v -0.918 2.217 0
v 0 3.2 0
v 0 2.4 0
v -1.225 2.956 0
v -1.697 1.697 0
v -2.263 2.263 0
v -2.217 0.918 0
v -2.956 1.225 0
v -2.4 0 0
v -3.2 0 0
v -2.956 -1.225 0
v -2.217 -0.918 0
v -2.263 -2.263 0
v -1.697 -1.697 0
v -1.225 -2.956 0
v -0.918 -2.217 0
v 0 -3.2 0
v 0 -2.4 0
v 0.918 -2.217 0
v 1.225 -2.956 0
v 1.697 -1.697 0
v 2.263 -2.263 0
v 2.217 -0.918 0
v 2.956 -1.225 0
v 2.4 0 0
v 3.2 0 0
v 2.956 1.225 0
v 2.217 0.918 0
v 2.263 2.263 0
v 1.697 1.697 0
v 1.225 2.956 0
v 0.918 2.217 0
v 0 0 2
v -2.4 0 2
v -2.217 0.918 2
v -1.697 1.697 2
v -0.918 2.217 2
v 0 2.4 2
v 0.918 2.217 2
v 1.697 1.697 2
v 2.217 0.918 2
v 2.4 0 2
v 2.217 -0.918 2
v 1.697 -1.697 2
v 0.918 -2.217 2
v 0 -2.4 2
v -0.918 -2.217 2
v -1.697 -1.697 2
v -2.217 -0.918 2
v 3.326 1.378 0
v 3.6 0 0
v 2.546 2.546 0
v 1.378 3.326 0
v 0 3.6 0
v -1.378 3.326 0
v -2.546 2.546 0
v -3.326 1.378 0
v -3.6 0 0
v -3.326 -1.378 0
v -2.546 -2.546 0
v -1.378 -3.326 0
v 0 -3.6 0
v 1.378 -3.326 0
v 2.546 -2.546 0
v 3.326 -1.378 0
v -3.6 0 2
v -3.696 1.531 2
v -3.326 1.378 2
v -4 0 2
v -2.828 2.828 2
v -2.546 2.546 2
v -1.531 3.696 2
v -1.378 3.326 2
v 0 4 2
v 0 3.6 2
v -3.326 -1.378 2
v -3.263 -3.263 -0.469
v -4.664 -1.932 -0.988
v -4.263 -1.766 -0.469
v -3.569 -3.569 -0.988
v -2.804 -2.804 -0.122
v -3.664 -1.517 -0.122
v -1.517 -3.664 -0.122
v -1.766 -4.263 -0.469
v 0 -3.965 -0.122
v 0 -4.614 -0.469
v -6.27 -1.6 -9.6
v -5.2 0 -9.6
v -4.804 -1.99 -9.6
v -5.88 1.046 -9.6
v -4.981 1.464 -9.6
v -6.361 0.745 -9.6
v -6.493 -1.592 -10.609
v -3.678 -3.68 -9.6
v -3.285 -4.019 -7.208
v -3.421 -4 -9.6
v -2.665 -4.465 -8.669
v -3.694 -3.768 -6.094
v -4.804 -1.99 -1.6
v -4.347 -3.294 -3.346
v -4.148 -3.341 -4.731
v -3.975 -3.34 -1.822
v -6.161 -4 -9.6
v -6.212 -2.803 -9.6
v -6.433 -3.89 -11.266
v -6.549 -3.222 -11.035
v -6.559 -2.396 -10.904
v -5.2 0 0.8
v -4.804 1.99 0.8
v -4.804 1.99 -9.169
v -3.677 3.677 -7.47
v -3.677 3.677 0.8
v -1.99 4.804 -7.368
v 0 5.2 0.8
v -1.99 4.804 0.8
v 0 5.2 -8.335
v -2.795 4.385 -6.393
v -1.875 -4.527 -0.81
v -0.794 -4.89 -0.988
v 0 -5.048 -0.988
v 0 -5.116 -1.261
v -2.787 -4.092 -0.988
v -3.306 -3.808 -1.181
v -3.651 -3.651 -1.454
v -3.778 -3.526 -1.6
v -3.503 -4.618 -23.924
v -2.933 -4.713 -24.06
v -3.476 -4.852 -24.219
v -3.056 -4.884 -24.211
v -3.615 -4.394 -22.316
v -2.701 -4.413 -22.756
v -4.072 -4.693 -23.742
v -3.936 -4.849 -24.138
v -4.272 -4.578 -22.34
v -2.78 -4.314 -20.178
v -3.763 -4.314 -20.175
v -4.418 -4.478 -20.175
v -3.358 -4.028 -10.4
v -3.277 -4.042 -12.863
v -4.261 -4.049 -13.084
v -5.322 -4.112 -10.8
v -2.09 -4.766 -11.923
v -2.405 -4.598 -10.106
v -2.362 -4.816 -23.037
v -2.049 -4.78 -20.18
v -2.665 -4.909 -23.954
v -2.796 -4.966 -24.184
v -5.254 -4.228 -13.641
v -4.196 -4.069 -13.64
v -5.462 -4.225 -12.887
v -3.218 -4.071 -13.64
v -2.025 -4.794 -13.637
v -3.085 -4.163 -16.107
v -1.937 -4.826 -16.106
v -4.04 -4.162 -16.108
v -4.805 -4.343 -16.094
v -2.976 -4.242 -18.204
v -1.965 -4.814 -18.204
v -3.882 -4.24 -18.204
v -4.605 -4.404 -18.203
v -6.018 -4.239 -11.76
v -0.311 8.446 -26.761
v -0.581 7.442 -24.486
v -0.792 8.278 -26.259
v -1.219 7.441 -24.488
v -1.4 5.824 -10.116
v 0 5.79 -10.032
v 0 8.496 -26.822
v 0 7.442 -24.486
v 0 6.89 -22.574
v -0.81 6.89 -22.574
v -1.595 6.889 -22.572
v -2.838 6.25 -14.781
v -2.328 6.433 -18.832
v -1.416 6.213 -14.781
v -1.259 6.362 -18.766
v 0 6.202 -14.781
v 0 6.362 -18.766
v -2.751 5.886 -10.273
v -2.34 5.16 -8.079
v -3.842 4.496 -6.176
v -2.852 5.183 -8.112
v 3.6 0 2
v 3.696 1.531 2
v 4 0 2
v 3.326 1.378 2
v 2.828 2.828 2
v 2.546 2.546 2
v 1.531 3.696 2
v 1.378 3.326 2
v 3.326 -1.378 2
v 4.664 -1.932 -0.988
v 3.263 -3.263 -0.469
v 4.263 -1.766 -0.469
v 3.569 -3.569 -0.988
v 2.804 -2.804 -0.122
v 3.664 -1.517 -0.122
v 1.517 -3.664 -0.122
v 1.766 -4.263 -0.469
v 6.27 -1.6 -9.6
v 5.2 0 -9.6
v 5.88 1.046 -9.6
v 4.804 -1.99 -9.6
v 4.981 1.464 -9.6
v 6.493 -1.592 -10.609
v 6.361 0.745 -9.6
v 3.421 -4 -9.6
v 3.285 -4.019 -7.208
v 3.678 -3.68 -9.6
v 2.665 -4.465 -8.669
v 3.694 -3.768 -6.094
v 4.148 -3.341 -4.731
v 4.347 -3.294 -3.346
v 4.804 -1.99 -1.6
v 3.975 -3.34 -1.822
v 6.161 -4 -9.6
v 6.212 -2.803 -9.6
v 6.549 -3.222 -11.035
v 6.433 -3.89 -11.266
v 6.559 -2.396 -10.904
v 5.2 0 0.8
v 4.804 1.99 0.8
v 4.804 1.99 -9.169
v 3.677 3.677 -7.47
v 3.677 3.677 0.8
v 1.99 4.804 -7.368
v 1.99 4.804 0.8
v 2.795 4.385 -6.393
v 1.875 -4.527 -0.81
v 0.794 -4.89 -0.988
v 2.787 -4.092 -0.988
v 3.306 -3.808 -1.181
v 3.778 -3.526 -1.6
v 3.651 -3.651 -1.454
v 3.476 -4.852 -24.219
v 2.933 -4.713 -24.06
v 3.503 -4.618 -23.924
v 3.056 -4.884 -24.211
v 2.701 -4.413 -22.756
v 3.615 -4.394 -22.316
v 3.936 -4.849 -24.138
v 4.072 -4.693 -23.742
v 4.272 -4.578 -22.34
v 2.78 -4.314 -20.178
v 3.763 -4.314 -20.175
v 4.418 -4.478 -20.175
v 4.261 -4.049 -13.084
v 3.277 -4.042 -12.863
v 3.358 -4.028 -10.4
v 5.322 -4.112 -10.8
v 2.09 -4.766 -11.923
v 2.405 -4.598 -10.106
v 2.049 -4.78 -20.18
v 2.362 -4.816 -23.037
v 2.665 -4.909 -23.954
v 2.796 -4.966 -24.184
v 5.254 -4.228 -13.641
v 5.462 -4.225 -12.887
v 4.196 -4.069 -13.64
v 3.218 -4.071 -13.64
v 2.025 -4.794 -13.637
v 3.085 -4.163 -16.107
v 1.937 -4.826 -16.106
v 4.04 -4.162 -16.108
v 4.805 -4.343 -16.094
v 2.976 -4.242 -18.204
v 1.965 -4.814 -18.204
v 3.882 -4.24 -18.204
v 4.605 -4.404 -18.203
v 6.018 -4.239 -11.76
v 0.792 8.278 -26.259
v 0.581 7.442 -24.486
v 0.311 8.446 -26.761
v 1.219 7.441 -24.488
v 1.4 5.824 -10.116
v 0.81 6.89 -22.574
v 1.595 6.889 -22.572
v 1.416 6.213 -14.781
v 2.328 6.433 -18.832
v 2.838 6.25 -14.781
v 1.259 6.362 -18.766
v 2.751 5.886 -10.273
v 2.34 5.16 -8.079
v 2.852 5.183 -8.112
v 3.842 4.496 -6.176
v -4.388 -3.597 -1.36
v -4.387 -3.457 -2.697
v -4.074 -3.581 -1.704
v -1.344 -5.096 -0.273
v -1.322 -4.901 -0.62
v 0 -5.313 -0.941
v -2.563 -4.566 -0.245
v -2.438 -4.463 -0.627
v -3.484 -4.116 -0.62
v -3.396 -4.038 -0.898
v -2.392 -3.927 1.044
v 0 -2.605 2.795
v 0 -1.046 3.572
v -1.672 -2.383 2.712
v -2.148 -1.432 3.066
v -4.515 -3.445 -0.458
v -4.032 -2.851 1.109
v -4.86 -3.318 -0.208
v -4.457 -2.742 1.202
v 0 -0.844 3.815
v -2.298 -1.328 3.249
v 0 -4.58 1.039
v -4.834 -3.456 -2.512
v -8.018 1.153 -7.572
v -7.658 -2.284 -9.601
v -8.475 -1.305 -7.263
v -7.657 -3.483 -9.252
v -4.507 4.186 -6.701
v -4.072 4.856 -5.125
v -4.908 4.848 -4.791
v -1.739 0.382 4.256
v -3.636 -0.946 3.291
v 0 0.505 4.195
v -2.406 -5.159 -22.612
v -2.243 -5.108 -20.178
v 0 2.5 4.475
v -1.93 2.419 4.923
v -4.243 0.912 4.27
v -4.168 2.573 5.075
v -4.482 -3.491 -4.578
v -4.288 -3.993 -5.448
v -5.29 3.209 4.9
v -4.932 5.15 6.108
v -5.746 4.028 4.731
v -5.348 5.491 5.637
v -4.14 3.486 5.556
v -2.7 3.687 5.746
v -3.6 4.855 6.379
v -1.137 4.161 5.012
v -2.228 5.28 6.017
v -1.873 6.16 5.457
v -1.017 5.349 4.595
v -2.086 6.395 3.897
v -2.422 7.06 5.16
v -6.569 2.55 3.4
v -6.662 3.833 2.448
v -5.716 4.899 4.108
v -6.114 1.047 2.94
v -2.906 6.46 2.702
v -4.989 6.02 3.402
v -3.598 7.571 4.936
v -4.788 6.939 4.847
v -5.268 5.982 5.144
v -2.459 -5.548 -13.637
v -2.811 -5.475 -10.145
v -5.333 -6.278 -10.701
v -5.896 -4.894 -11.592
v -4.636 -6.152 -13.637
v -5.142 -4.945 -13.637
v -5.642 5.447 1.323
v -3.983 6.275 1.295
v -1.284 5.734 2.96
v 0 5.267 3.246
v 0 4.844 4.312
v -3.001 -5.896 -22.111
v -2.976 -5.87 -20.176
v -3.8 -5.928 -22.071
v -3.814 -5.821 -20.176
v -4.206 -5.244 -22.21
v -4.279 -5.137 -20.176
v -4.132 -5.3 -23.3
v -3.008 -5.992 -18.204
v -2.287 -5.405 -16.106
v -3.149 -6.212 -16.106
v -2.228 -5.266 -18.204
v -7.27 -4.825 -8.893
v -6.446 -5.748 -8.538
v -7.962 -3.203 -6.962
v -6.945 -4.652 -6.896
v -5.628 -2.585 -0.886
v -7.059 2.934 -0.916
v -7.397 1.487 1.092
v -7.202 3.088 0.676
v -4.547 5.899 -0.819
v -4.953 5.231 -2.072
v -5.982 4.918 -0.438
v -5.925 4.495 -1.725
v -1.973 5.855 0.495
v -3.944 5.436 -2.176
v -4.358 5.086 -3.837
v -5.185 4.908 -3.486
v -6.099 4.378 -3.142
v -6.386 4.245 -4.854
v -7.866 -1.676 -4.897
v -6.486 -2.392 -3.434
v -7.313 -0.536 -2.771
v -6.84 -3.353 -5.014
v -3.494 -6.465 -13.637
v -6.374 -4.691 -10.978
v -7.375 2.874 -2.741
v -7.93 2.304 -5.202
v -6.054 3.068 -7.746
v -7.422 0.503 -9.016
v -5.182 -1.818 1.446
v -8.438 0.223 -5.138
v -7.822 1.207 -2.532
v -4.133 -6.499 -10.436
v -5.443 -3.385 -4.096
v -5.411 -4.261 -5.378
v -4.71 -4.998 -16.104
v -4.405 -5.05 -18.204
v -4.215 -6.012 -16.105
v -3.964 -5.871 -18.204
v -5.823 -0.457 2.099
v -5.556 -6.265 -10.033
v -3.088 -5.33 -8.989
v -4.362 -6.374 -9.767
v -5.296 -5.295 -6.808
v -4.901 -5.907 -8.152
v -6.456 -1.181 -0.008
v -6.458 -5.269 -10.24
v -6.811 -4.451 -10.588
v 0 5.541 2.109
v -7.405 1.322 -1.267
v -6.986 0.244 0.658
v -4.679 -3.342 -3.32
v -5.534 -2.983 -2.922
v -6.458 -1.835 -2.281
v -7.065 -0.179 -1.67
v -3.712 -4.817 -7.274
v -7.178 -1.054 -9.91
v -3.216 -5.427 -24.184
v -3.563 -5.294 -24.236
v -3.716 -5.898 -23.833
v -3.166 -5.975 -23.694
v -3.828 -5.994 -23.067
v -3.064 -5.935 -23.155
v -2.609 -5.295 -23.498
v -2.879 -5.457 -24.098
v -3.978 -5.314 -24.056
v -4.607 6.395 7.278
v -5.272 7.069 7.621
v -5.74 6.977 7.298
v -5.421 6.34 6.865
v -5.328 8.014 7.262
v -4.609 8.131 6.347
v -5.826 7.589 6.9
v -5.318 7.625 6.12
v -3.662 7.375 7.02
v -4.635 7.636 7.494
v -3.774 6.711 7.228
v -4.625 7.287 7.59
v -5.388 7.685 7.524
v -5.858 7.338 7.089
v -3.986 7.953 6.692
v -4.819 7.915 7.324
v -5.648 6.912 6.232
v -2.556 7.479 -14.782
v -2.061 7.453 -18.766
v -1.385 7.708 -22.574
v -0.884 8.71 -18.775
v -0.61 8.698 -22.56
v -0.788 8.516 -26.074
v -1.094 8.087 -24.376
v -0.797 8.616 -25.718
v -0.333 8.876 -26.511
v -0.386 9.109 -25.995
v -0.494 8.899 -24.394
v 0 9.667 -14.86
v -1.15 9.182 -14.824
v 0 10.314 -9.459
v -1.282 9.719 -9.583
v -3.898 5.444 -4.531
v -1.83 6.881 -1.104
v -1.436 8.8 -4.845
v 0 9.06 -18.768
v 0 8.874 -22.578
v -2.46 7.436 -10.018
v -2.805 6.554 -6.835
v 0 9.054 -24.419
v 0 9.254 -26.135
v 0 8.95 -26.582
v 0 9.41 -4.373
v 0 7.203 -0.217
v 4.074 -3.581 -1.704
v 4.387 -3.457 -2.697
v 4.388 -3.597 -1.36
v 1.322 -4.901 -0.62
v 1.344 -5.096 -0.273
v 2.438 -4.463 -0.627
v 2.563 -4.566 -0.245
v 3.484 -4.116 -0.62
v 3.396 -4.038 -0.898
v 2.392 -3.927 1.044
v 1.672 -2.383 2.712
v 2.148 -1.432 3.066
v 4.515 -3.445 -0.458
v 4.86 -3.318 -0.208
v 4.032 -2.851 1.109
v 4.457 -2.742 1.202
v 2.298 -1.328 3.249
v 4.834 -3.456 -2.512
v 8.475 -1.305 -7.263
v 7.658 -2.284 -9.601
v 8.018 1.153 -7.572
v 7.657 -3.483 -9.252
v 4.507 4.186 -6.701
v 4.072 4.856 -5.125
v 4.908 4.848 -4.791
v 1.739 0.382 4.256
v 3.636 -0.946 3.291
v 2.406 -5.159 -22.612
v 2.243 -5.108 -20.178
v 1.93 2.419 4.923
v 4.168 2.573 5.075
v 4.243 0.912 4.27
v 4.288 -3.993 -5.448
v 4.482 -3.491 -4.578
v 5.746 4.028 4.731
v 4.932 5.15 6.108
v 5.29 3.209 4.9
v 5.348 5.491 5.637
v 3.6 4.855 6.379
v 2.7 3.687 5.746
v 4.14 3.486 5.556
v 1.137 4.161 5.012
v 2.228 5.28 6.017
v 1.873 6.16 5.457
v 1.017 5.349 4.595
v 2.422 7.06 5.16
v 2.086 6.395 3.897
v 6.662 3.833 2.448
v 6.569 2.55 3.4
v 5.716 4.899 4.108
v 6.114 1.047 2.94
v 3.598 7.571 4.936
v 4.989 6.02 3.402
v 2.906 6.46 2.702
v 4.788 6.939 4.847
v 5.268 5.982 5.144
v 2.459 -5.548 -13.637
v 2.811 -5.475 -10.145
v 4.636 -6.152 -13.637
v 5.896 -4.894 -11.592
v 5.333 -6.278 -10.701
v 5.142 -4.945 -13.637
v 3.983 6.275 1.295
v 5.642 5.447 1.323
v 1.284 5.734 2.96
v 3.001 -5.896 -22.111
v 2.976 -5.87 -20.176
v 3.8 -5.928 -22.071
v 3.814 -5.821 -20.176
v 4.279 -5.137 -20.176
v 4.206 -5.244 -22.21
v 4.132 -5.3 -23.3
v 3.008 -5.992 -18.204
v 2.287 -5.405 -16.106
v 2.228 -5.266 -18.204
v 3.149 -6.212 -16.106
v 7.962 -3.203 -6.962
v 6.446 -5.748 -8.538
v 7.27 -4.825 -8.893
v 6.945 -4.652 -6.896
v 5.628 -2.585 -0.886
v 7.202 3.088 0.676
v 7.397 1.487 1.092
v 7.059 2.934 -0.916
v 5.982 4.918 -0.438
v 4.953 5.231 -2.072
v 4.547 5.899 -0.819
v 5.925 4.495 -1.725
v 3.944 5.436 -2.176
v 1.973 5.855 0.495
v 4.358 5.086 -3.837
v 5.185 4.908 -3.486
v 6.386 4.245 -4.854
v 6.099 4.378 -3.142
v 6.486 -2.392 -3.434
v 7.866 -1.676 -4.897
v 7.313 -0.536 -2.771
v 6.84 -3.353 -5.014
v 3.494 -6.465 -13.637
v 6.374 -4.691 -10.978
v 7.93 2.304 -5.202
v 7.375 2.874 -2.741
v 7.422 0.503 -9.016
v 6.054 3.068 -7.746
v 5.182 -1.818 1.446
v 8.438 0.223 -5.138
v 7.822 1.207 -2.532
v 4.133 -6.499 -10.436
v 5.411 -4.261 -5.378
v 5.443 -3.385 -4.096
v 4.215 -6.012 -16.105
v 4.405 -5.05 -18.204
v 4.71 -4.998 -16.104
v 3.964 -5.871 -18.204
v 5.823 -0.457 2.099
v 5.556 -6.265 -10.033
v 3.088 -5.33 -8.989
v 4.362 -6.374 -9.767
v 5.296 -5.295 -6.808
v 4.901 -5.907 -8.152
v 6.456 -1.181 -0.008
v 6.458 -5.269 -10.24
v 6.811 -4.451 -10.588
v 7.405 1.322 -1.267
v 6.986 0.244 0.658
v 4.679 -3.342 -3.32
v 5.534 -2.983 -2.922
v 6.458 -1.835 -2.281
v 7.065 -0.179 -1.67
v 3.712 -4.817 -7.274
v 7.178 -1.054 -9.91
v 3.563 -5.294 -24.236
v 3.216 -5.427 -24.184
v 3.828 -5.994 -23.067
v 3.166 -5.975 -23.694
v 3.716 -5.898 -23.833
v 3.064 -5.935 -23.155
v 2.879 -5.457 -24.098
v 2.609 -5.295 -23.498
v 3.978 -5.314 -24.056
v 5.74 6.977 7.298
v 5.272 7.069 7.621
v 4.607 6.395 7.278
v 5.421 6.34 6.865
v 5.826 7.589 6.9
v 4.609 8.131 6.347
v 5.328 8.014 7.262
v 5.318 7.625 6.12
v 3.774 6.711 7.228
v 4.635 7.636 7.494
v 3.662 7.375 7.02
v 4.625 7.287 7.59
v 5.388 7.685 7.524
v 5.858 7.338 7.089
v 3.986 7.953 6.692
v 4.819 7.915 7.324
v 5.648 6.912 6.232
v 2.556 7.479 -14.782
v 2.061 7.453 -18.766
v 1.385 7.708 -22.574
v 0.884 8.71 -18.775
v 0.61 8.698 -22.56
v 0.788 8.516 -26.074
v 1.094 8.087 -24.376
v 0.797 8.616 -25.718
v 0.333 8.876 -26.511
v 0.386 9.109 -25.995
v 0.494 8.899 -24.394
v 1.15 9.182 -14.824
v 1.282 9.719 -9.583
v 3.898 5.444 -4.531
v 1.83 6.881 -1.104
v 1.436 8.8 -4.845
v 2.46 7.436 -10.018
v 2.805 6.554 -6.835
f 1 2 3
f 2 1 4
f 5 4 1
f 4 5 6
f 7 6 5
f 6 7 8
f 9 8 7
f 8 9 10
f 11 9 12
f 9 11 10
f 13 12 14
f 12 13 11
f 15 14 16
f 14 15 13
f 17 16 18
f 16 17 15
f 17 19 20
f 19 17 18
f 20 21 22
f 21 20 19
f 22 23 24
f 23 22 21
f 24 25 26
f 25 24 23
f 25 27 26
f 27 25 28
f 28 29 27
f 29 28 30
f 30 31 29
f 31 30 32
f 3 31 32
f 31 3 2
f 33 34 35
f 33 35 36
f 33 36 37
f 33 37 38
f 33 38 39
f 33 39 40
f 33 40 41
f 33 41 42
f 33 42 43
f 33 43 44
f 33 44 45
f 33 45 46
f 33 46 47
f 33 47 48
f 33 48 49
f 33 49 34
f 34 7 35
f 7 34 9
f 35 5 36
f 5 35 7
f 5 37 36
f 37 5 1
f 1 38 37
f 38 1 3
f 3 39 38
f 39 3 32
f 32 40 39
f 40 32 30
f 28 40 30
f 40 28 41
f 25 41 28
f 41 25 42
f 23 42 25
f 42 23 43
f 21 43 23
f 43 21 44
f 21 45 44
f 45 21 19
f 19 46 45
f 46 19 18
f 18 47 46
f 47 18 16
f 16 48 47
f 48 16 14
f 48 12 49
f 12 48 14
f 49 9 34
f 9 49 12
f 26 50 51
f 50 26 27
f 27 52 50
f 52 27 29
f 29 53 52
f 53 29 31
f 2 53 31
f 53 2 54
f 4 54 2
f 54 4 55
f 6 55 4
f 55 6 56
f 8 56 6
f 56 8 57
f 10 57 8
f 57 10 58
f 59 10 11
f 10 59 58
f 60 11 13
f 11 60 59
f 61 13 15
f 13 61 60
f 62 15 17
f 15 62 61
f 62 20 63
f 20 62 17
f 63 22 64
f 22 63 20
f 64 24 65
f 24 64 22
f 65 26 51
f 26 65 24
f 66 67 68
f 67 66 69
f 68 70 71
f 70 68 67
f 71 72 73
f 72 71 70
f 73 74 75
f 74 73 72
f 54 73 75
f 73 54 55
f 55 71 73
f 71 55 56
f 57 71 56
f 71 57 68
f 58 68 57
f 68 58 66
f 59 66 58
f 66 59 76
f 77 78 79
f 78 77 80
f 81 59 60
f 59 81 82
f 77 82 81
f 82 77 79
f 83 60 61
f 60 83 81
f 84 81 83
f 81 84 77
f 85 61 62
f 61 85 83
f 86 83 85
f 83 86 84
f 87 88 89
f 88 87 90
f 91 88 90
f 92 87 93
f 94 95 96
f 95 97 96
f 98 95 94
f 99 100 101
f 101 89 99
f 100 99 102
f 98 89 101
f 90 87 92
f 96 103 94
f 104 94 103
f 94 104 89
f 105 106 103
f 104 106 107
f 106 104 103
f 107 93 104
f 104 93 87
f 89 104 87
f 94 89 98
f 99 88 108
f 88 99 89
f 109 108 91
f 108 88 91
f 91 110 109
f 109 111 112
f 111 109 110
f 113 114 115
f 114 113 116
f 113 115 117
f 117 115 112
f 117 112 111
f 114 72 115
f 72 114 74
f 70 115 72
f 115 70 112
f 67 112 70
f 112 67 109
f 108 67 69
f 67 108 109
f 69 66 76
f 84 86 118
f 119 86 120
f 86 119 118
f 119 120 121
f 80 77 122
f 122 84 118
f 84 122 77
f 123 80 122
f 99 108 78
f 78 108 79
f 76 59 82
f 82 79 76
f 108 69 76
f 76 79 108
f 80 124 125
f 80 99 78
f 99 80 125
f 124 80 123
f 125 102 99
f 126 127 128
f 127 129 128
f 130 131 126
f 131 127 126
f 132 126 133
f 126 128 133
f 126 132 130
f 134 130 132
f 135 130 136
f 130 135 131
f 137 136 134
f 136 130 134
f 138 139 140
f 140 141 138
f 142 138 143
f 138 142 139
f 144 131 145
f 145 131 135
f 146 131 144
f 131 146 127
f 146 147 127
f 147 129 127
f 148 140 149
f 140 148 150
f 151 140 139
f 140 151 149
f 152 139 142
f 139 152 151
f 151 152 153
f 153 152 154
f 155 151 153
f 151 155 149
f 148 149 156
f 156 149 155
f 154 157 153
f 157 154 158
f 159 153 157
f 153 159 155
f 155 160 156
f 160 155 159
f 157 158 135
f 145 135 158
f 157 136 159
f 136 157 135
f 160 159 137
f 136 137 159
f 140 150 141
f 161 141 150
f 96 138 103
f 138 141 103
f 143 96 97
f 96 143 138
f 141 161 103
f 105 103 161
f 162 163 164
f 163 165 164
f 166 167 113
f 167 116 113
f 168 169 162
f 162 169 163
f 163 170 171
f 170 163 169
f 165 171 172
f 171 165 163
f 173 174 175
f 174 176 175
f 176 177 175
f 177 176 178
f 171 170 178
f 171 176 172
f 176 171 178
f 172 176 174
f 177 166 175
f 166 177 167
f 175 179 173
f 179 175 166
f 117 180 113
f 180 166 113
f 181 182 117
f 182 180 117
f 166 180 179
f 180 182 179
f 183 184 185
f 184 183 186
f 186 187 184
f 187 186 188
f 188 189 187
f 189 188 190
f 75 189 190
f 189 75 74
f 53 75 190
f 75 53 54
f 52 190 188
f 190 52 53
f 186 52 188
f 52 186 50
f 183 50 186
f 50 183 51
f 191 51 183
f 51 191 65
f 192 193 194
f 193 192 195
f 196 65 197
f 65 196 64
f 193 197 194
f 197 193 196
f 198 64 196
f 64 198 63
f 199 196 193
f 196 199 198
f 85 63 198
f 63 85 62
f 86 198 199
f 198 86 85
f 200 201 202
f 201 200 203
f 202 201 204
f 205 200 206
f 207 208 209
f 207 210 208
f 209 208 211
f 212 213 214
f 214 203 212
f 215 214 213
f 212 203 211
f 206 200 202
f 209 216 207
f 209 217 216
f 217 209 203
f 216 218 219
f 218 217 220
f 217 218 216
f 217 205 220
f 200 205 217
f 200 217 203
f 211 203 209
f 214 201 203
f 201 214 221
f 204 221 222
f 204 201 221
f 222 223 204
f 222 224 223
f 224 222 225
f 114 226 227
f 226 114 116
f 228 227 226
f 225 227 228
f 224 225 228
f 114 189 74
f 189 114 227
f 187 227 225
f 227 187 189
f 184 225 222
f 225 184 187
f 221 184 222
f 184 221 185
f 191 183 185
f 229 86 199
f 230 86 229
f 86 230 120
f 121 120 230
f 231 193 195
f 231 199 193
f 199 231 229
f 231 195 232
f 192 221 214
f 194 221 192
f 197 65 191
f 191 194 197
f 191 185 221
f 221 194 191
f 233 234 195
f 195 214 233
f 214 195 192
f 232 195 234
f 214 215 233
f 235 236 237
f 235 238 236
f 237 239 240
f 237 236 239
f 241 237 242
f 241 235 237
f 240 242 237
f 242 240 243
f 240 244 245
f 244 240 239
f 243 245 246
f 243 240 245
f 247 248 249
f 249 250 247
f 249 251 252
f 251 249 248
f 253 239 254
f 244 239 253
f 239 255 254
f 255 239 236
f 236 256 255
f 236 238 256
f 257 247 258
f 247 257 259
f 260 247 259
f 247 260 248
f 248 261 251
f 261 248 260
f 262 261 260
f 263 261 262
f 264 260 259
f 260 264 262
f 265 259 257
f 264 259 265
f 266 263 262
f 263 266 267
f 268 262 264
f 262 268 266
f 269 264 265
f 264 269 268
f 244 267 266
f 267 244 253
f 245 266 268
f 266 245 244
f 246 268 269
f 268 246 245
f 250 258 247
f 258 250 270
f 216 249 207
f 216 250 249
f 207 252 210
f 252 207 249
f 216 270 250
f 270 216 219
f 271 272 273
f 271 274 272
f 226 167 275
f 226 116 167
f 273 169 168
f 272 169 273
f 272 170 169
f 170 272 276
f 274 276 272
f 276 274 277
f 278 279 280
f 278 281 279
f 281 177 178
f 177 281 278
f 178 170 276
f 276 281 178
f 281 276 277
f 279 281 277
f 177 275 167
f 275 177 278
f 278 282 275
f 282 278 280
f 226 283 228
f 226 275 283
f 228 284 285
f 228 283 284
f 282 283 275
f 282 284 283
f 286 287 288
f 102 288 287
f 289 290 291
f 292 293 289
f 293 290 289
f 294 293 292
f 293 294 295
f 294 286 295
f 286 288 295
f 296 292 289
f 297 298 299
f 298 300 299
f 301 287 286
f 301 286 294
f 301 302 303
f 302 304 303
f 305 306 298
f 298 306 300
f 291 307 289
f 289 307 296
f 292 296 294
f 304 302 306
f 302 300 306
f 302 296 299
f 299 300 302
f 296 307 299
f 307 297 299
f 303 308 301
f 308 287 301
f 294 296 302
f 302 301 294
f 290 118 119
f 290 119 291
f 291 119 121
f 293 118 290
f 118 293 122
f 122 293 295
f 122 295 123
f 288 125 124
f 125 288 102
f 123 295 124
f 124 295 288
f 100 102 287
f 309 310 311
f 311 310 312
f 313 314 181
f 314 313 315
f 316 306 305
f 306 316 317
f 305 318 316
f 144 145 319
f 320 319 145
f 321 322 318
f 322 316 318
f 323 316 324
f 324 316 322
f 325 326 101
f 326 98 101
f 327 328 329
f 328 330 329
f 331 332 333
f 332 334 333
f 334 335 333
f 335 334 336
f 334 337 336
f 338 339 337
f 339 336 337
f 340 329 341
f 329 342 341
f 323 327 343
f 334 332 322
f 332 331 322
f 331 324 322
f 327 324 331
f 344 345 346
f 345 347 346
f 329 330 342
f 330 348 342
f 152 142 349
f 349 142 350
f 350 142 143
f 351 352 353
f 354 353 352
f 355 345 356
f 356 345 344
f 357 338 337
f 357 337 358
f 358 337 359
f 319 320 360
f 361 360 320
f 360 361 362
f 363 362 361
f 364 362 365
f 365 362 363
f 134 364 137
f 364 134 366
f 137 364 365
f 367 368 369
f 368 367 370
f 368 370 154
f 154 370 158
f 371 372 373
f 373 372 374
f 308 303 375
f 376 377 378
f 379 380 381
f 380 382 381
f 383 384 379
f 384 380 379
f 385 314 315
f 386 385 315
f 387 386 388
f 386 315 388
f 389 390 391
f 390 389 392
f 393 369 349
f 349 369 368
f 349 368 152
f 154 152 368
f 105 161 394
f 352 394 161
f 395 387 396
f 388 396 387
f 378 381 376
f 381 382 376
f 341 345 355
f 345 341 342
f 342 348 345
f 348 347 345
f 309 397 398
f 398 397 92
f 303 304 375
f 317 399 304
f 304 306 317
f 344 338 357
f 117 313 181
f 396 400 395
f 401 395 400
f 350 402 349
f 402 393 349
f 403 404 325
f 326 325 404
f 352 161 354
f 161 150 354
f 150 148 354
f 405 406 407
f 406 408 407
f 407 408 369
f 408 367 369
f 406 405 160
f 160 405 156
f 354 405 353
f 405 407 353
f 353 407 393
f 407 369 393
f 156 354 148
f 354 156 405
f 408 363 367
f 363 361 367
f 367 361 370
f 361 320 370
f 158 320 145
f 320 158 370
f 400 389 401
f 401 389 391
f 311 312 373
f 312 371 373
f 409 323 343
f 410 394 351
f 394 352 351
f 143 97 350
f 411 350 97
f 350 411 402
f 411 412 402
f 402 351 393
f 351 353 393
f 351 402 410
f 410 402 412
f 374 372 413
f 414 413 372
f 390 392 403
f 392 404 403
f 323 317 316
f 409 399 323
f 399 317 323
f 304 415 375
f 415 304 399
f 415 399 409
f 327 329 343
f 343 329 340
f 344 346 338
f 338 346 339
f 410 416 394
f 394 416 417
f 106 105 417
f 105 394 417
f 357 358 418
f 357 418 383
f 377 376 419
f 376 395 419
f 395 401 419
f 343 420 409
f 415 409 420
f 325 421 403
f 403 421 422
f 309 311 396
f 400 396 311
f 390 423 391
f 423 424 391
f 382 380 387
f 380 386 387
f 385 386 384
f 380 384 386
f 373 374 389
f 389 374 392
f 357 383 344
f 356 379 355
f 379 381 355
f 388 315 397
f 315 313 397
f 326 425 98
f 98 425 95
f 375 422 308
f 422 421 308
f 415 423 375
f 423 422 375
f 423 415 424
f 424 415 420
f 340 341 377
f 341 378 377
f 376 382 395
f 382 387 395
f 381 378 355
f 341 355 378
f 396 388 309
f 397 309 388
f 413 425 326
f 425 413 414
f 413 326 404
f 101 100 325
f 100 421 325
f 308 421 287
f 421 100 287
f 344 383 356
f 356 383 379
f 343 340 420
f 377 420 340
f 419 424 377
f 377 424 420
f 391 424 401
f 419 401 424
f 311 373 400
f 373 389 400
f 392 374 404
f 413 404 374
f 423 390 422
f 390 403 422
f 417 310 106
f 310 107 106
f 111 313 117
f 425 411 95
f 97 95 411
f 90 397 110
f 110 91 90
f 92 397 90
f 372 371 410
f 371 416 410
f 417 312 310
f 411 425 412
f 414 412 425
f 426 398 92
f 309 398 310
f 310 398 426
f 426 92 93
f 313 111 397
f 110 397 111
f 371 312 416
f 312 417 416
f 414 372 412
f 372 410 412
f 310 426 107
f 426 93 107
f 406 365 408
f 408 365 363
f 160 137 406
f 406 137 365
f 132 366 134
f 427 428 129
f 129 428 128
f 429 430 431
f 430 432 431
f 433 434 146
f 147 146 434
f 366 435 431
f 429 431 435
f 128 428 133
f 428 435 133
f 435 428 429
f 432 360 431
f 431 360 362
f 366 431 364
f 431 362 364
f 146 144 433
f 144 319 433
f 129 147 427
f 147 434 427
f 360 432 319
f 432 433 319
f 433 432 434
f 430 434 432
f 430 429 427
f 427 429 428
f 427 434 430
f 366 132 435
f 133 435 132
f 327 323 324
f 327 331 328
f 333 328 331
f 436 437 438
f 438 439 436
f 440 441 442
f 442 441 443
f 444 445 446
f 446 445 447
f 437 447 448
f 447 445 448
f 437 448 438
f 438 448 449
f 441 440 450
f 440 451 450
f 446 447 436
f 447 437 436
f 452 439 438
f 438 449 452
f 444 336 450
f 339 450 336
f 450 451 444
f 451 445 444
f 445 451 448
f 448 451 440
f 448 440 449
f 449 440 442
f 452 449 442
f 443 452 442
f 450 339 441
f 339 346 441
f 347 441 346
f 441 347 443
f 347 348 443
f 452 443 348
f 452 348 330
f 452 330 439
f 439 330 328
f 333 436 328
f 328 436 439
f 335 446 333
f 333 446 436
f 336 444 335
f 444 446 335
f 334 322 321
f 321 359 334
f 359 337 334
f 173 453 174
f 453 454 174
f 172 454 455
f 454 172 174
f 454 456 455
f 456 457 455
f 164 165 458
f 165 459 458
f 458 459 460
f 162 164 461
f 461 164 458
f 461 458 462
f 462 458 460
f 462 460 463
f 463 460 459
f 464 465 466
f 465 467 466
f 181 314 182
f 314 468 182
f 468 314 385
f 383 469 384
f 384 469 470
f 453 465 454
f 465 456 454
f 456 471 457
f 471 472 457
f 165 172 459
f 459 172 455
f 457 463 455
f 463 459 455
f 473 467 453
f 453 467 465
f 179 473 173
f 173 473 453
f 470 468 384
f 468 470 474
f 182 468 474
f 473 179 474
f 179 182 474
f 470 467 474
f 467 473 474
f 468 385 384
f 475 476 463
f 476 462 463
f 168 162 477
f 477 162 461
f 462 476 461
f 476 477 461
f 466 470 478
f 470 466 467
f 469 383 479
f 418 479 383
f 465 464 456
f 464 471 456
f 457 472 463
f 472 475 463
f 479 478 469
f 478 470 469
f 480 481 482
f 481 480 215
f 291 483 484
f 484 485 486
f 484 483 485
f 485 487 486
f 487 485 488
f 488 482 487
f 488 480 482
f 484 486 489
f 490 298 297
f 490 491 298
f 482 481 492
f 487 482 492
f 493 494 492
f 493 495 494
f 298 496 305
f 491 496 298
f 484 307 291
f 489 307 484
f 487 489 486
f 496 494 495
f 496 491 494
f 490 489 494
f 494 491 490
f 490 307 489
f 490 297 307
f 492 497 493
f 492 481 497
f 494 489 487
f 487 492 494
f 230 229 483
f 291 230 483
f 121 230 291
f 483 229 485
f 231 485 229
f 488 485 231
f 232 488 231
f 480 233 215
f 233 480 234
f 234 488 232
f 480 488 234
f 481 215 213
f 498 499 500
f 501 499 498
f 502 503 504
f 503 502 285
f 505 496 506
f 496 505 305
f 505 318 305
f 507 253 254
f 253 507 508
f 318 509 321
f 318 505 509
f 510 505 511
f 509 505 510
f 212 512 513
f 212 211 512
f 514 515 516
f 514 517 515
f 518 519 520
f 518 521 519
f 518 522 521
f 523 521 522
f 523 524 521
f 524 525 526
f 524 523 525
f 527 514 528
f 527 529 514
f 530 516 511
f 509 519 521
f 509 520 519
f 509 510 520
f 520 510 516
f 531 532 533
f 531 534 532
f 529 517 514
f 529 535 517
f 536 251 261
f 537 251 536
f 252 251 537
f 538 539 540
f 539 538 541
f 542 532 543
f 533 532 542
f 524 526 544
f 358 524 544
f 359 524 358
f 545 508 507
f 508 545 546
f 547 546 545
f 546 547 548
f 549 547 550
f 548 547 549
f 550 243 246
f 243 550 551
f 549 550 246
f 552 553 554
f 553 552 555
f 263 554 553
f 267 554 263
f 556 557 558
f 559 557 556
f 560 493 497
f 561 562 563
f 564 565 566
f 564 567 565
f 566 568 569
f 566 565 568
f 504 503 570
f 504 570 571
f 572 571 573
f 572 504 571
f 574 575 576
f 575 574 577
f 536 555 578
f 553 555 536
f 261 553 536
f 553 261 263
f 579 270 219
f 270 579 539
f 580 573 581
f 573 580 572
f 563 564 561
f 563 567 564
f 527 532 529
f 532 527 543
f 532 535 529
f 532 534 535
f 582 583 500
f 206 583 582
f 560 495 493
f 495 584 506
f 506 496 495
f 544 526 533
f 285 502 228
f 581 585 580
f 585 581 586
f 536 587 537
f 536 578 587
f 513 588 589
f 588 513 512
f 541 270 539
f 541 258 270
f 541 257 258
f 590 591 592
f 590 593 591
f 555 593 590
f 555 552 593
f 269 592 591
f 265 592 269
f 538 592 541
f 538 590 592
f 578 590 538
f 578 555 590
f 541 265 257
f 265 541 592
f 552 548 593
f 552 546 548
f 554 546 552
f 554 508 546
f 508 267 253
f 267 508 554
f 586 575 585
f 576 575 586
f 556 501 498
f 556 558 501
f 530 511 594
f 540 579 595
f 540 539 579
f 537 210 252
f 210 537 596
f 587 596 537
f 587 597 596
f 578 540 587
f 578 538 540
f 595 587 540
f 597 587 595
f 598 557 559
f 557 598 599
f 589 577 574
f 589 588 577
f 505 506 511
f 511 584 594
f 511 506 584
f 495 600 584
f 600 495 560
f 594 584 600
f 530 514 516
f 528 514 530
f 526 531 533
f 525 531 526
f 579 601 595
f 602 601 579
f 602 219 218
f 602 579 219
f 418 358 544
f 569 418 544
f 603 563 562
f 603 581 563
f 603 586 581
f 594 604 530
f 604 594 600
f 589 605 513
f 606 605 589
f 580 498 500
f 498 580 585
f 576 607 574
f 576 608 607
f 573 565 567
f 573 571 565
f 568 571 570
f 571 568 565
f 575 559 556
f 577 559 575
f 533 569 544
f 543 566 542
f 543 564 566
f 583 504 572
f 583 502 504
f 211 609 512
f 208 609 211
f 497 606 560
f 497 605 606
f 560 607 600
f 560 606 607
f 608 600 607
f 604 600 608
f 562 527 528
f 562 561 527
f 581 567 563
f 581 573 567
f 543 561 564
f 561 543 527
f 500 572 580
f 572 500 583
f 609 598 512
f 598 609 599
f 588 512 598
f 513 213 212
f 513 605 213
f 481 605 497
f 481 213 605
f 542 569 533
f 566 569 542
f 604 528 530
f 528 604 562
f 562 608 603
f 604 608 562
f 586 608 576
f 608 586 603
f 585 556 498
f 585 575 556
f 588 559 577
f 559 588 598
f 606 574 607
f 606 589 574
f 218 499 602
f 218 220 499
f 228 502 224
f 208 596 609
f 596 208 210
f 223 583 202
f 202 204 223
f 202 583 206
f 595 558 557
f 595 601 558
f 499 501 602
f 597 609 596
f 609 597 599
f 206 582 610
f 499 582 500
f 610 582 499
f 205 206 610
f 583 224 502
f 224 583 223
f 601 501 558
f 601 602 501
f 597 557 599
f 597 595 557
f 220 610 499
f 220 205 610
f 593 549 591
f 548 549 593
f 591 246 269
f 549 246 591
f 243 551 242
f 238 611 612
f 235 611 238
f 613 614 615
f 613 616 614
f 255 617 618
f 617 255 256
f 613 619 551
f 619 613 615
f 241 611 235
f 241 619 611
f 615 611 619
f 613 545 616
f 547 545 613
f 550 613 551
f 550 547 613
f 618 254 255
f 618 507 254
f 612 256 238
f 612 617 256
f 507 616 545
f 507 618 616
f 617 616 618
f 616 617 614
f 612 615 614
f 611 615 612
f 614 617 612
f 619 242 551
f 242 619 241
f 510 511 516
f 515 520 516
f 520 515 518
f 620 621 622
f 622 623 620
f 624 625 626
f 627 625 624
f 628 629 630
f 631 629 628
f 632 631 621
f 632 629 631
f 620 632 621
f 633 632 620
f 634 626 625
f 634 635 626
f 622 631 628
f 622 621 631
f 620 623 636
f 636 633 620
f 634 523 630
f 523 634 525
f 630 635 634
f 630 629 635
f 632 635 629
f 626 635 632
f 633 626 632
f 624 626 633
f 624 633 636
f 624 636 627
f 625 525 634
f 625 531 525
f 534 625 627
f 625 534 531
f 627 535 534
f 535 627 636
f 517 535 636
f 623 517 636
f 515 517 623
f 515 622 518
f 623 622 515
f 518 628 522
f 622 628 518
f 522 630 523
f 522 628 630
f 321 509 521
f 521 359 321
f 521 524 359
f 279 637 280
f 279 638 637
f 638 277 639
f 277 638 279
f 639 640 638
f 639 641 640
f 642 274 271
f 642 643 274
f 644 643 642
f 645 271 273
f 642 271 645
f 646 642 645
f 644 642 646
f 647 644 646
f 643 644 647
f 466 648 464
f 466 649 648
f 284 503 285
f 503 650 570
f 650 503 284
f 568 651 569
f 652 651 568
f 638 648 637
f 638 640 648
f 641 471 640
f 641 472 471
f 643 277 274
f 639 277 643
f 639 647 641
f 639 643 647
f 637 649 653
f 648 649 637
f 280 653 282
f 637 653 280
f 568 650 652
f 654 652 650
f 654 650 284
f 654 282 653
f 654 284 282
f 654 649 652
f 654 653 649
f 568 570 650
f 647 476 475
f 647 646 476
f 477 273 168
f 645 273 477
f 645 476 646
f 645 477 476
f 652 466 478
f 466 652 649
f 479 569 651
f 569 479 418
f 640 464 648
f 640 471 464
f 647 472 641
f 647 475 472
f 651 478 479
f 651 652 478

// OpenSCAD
use <../lib.scad>
use <../p/4-4ring8.scad>
use <s/92745s01.scad>
use <s/92745s03.scad>
use <../p/stud4o.scad>
function ldraw_lib__92745() = [
// 0 Minifig Headdress SW Togruta Montrals
// 0 Name: 92745.dat
// 0 Author: Gerald Lasser [GeraldLasser]
// 0 !LDRAW_ORG Part UPDATE 2023-05
// 0 !LICENSE Licensed under CC BY 4.0 : see CAreadme.txt
// 
// 0 BFC CERTIFY CCW
  [0,"BFC","CERTIFY"],
  [0,"BFC","CCW"],
// 
// 0 !CATEGORY Minifig Headwear
// 
// 0 !HISTORY 2013-08-14 {LEGO Digital Designer} Original part shape
// 0 !HISTORY 2021-09-13 [GeraldLasser] File preparation for LDraw Parts Tracker
// 0 !HISTORY 2023-10-31 [OrionP] Official Update 2023-05
// 
// 
// 1 16 0 -5 0 1 0 0 0 -1.25 0 0 0 1 stud4o.dat
  [1,16,0,-5,0,1,0,0,0,-1.25,0,0,0,1, ldraw_lib__stud4o()],
// 1 16 0 0 0 1 0 0 0 -1 0 0 0 1 4-4ring8.dat
  [1,16,0,0,0,1,0,0,0,-1,0,0,0,1, ldraw_lib__4_4ring8()],
// 
// 1 16 0 0 0 1 0 0 0 1 0 0 0 1 s\92745s01.dat
  [1,16,0,0,0,1,0,0,0,1,0,0,0,1, ldraw_lib__s__92745s01()],
// 
// 1 16 0 0 0 1 0 0 0 1 0 0 0 1 s\92745s03.dat
  [1,16,0,0,0,1,0,0,0,1,0,0,0,1, ldraw_lib__s__92745s03()],
// 1 16 0 0 0 -1 0 0 0 1 0 0 0 1 s\92745s03.dat
  [1,16,0,0,0,-1,0,0,0,1,0,0,0,1, ldraw_lib__s__92745s03()],
];
module ldraw_lib__92745(step=0, col=false, unit=2/5, alt=false, line=0.2, solid=!$preview)
    makepoly(ldraw_lib__92745(), step=step, col=col, unit=unit, alt=alt, line=line, solid=solid);
ldraw_lib__92745(line=0.2);
